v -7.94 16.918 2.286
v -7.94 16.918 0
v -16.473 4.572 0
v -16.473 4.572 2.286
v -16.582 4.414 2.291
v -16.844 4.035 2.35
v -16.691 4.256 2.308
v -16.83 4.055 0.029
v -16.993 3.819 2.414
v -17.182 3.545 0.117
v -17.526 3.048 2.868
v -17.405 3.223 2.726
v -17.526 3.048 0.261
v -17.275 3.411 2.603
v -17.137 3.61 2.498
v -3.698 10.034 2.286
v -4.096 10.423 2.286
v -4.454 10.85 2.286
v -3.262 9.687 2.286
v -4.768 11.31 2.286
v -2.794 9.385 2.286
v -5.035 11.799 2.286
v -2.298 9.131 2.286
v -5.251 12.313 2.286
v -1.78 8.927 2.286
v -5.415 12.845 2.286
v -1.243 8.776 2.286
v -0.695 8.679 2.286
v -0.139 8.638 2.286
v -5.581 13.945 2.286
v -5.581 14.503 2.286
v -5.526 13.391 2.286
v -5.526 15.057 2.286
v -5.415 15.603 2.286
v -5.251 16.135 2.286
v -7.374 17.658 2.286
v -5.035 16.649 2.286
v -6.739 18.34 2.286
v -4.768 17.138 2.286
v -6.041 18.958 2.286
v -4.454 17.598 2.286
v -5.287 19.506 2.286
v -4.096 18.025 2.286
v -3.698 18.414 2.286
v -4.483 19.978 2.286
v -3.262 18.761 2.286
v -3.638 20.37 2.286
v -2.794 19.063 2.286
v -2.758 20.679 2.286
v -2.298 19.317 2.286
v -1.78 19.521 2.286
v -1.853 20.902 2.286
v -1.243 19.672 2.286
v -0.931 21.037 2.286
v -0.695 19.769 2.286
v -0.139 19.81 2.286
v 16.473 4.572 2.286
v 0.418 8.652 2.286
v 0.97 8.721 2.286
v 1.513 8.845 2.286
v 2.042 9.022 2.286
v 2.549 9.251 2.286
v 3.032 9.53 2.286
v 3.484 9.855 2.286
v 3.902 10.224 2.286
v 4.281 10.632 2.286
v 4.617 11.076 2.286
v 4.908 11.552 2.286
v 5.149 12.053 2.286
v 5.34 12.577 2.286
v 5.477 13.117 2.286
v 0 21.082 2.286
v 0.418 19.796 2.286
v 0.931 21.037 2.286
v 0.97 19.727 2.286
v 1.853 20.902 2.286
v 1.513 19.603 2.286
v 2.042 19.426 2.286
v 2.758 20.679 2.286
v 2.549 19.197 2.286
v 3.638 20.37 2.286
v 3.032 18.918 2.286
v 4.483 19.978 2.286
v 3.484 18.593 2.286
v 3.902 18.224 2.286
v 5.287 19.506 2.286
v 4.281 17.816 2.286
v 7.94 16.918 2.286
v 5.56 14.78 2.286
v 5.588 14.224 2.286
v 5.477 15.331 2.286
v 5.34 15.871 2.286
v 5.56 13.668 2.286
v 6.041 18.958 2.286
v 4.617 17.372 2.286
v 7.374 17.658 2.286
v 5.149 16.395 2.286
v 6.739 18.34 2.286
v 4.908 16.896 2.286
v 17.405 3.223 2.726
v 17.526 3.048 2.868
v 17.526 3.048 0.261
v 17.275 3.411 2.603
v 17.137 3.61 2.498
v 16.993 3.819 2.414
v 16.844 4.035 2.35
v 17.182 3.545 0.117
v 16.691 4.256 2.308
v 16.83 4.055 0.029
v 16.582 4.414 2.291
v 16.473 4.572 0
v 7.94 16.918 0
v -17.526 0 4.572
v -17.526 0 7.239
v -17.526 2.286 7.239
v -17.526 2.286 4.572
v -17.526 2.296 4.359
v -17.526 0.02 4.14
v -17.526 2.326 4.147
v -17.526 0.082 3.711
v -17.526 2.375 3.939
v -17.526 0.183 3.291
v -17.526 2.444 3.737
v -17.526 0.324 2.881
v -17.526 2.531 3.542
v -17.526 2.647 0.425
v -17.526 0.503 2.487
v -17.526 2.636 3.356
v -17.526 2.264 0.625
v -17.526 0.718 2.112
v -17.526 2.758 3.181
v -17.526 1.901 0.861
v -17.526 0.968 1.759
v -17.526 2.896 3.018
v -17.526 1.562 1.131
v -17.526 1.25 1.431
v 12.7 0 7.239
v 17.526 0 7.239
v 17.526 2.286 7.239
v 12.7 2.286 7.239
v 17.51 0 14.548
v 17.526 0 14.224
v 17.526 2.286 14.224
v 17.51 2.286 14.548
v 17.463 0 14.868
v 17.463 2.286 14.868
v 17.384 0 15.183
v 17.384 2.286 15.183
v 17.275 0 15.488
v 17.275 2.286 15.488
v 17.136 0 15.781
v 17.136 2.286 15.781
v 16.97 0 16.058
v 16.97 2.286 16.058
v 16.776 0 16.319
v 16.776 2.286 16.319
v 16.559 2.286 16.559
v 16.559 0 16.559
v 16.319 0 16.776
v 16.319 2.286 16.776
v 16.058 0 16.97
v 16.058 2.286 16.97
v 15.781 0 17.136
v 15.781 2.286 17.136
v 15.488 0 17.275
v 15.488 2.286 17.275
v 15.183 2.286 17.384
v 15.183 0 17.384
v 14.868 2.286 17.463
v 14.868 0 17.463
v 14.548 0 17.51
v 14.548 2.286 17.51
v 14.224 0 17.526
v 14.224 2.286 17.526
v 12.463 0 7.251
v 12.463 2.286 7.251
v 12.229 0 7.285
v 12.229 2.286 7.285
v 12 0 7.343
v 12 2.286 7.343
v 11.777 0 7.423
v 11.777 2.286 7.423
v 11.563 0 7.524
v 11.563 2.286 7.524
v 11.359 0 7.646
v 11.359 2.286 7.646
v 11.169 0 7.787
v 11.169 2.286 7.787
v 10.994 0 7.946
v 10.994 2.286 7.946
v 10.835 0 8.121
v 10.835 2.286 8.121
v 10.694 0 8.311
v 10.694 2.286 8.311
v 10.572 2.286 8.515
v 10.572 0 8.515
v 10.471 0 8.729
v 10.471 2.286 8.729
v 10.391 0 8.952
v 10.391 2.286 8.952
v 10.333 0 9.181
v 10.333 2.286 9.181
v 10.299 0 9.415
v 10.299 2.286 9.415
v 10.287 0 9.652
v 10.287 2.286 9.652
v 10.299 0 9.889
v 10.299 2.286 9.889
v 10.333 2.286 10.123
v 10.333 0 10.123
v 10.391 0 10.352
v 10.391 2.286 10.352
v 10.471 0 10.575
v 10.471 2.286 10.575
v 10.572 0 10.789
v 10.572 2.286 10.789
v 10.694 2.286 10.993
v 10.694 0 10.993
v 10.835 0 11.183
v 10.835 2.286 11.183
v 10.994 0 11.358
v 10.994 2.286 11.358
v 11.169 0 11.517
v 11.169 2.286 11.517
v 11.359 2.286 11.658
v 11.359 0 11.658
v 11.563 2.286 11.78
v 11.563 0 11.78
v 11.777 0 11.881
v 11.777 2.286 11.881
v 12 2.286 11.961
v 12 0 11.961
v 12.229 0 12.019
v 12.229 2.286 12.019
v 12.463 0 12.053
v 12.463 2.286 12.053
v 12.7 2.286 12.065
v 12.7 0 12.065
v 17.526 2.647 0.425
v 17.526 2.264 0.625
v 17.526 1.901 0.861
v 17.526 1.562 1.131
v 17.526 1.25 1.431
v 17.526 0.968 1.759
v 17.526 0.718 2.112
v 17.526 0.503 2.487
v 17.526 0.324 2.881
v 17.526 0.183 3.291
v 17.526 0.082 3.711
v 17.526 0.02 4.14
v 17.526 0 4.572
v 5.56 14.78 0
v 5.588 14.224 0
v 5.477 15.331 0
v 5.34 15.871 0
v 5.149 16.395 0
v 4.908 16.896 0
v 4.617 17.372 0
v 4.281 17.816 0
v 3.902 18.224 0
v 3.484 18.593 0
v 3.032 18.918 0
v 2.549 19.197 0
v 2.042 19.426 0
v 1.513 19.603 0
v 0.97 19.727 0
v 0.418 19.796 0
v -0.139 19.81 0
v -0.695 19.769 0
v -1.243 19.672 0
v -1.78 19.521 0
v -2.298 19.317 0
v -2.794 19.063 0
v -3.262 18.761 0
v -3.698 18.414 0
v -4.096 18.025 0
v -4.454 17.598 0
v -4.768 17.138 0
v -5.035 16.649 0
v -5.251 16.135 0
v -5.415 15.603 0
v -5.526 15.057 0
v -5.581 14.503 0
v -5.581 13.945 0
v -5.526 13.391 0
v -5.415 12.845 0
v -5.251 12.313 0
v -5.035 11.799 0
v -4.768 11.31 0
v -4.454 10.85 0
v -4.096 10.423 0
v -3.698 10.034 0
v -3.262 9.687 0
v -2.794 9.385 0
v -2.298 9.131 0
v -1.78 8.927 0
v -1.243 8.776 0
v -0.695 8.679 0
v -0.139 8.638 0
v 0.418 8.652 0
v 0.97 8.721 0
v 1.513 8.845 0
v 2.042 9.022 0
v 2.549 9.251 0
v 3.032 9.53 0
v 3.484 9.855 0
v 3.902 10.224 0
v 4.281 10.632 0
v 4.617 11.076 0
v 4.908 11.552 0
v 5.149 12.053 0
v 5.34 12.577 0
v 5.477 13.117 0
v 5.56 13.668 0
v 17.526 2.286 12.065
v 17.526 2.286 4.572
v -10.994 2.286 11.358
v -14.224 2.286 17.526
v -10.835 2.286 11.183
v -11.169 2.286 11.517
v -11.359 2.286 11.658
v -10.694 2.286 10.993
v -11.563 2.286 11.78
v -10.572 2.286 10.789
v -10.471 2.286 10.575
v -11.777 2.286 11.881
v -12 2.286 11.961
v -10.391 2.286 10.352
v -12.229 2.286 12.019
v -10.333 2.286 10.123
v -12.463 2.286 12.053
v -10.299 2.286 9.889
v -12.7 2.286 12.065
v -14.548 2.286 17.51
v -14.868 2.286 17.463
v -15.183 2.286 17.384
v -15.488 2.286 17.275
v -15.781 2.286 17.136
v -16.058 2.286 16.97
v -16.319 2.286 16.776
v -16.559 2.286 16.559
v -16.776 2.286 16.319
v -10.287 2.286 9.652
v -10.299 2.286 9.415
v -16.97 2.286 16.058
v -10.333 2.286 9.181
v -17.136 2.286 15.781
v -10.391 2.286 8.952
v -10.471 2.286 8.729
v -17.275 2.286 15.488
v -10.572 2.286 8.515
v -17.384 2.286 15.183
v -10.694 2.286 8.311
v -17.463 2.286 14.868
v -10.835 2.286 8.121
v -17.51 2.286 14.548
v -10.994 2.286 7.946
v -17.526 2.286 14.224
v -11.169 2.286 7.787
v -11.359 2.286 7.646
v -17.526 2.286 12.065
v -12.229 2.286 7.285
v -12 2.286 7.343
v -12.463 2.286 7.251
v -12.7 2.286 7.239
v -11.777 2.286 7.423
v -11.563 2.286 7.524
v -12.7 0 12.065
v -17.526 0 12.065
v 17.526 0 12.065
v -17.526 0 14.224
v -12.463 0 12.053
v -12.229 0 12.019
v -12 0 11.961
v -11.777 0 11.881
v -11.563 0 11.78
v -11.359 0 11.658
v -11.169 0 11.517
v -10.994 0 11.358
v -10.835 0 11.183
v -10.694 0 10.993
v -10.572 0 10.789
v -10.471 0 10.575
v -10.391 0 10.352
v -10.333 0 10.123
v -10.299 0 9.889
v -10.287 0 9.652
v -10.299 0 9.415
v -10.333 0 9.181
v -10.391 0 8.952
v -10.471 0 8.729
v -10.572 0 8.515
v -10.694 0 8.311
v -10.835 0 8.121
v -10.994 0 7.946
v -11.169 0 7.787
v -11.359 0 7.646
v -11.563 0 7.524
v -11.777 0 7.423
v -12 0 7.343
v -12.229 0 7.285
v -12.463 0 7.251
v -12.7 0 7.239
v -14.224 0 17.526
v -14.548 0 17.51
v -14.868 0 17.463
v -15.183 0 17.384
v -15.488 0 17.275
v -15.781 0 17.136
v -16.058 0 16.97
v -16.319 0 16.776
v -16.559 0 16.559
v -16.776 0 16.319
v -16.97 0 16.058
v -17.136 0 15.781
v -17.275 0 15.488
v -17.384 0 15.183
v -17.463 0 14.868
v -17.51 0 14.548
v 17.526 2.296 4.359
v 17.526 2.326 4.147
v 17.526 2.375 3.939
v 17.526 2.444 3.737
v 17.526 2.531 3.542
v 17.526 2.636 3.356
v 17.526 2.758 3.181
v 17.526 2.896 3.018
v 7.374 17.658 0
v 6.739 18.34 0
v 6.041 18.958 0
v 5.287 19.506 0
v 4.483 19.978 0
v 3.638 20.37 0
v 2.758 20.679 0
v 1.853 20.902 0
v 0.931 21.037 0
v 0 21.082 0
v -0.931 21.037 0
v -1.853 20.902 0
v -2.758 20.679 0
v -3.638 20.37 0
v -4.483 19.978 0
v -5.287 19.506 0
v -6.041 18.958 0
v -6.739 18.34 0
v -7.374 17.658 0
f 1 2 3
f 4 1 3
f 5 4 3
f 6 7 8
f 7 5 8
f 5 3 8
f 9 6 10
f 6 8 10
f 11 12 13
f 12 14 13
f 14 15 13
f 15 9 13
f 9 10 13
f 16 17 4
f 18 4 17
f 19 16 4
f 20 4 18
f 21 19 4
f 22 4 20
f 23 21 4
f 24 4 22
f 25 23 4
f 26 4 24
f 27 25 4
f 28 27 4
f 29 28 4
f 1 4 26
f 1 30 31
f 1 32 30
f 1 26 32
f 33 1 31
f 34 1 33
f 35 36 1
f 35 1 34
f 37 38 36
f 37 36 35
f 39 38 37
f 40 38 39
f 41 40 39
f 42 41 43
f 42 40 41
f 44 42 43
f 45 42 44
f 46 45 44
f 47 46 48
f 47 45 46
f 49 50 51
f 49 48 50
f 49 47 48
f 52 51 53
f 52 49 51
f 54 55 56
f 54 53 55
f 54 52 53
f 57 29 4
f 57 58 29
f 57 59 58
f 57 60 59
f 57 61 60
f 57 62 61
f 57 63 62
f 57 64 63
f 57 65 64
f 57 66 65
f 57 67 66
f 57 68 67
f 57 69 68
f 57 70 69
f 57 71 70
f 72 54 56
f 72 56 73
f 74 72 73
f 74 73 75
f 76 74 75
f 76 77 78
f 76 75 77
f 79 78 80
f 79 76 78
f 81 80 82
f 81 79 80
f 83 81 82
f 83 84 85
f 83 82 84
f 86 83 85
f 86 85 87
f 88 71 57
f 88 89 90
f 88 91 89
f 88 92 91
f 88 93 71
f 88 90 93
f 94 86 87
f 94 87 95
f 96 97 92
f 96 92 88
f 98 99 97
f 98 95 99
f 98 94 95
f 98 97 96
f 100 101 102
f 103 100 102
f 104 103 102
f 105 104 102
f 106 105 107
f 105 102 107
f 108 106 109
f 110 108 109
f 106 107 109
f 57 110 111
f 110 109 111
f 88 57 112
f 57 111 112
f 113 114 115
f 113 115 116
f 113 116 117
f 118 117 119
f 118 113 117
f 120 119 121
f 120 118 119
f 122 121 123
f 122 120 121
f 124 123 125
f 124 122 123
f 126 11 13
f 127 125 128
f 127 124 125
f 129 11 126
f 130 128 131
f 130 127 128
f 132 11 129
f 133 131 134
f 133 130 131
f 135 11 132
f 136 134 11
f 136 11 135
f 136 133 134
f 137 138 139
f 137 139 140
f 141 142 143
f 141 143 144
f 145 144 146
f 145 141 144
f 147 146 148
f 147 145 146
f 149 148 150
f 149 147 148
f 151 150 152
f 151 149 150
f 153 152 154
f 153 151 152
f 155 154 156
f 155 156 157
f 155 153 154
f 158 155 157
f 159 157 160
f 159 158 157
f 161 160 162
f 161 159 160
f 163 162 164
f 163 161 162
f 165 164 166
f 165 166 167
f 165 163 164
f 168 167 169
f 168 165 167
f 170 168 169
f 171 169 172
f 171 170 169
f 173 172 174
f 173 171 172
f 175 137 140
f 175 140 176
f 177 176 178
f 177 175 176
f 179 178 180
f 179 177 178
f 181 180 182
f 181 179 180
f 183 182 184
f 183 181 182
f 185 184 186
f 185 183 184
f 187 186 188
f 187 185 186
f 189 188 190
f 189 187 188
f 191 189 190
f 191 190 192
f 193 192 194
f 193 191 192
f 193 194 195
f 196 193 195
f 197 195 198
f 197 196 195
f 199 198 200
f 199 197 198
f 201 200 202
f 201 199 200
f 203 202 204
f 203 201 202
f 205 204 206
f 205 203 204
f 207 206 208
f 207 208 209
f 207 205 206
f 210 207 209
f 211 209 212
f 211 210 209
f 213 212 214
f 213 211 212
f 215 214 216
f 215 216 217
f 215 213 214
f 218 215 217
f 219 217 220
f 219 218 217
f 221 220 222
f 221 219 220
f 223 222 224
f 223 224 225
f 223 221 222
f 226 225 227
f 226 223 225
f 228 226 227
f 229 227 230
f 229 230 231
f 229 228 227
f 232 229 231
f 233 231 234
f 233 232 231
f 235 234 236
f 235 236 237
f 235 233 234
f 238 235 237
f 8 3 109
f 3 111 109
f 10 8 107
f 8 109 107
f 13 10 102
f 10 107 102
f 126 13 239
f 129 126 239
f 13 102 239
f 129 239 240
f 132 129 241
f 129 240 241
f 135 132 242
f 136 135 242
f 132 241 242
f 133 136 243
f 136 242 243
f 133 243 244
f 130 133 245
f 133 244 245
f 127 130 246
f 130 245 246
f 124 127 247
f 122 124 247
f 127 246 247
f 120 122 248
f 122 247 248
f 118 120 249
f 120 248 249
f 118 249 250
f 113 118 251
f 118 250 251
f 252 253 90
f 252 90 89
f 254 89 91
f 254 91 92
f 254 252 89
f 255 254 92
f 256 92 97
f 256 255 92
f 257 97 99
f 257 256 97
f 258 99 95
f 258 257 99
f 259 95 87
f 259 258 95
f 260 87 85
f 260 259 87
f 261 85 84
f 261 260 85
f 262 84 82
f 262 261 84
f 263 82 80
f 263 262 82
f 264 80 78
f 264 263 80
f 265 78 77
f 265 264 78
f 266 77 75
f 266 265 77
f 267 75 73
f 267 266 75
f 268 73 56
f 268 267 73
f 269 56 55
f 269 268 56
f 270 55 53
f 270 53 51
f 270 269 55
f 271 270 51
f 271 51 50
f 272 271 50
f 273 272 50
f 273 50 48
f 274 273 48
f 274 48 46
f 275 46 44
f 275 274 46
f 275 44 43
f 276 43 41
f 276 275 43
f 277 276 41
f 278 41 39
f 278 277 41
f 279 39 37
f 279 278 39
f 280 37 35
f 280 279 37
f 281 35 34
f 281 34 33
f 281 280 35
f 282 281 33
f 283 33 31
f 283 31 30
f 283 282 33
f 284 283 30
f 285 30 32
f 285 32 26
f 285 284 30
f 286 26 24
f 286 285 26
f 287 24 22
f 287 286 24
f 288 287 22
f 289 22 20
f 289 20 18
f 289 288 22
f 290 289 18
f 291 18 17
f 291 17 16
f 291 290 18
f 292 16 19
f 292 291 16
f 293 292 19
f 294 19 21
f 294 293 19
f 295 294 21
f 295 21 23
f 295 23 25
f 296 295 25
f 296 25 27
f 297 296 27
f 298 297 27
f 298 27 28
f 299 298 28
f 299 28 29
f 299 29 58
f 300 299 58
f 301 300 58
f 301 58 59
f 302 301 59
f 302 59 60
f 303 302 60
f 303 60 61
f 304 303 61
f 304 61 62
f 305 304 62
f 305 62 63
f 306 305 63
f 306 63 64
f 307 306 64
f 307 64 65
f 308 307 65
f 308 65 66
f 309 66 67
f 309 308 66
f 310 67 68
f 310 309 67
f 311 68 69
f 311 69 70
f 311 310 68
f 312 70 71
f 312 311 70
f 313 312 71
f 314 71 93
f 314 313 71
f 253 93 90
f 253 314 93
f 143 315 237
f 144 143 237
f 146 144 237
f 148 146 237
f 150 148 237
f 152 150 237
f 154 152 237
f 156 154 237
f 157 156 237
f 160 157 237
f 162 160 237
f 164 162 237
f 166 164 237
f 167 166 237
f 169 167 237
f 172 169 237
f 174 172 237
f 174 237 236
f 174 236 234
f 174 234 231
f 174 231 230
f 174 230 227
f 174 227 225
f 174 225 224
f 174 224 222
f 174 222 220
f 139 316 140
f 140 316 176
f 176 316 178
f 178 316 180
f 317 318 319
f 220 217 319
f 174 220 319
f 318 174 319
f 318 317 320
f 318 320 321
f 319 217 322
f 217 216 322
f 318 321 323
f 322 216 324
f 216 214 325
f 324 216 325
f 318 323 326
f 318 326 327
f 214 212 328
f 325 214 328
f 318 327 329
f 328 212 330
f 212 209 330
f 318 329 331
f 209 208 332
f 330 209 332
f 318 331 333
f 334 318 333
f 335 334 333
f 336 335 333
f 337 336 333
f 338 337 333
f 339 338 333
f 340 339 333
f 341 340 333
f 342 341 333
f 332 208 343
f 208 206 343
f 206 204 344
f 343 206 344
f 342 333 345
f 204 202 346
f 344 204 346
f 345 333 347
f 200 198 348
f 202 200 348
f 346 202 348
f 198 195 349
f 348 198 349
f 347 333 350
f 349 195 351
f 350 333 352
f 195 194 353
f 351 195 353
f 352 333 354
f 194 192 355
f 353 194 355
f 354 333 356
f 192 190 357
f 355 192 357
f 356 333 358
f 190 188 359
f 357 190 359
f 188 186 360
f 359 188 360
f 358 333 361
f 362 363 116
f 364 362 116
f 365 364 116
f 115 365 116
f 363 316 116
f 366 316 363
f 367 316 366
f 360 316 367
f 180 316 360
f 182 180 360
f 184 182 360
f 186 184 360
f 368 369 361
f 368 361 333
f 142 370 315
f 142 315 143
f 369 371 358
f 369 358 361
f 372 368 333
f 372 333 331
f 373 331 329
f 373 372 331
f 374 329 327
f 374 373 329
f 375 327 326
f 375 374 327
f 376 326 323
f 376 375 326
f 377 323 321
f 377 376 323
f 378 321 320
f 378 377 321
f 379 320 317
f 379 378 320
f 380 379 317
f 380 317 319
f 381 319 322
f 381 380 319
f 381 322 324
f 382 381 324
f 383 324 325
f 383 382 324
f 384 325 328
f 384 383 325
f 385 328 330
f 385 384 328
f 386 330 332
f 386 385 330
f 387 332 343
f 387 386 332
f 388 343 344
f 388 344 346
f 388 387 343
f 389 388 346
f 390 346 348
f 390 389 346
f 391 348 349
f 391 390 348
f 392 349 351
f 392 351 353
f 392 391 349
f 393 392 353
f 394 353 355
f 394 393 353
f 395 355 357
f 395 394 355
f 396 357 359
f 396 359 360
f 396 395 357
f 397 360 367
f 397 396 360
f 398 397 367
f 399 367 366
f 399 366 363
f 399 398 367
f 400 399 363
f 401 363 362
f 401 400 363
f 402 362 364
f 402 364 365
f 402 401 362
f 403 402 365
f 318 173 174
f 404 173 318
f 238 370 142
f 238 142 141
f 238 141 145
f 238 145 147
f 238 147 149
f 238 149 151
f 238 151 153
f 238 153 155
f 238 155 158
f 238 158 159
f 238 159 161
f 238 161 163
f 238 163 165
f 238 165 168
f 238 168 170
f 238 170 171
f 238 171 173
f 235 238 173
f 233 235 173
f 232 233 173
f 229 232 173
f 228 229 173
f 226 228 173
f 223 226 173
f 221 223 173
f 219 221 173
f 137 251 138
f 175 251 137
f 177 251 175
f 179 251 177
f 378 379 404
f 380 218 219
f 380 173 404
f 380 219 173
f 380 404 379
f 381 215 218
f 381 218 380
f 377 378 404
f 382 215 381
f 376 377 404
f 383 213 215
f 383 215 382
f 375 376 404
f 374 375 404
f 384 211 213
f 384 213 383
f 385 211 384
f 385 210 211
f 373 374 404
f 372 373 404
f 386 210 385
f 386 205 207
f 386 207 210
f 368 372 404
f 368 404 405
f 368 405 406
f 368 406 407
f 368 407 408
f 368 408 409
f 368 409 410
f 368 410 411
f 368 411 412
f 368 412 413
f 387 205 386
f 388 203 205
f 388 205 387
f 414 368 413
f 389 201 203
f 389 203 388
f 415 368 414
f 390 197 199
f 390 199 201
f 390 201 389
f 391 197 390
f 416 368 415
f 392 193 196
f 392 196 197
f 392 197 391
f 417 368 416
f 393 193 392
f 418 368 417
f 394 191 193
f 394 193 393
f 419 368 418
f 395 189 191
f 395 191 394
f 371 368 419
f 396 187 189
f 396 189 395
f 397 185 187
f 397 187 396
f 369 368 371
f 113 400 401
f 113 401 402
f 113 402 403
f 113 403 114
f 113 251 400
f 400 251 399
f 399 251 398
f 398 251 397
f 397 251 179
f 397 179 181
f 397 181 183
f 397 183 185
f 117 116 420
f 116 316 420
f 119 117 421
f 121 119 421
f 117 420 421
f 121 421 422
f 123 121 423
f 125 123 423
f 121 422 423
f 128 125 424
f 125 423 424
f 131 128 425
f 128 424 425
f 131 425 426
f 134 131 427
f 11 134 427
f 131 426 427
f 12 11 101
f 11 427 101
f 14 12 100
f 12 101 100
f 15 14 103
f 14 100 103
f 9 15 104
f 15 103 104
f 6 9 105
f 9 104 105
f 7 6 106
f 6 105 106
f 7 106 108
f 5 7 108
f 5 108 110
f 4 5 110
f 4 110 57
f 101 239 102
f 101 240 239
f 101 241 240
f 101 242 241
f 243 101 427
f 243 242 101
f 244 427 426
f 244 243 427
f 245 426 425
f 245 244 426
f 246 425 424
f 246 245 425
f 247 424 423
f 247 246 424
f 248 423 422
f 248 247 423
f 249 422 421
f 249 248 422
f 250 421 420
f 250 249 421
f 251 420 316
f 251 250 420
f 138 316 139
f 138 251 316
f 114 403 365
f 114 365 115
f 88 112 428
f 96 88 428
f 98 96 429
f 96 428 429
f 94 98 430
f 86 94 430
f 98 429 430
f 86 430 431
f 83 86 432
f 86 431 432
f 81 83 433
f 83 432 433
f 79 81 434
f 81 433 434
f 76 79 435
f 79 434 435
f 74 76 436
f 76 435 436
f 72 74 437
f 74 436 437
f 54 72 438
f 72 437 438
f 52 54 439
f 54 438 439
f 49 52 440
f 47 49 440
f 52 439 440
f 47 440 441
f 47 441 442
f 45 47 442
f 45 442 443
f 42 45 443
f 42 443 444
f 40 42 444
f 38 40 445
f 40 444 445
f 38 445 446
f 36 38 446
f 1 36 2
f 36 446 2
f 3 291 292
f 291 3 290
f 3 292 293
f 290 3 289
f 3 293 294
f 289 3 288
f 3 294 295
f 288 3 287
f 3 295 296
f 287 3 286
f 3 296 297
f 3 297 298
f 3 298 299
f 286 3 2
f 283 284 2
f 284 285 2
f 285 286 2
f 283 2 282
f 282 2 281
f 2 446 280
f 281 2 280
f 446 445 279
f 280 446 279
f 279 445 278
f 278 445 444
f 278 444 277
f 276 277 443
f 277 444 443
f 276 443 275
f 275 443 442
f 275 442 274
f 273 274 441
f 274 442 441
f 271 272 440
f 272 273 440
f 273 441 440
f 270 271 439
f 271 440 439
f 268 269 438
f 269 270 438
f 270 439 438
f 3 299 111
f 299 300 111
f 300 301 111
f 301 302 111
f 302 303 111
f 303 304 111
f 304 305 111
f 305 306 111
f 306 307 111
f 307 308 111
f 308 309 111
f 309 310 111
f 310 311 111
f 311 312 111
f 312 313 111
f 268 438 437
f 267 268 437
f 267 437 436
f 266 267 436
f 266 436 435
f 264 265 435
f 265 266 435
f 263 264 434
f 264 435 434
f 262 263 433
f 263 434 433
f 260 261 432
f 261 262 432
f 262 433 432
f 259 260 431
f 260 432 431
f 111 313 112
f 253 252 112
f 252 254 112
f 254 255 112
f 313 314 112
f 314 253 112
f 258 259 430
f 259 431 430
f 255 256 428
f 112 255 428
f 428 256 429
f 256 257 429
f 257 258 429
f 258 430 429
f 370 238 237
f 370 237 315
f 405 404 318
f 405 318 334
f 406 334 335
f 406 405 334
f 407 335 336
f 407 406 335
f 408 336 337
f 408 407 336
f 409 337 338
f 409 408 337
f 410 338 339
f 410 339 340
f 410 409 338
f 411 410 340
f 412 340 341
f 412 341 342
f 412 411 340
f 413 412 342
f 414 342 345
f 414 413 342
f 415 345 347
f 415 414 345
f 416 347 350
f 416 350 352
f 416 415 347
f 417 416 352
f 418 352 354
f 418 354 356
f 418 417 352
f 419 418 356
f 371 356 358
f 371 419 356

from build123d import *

# Parameters (mm, degrees)
SKETCH1_R           = 5.588
BOSS_EXTRUDE1_DEPTH = 2.286
BOSS_EXTRUDE2_DEPTH = 2.286
FILLET1_R           = 2.286
FILLET2_R           = 4.572


with BuildPart() as part:
    # Sketch1 → Boss-Extrude1 (new body)
    with BuildSketch(Plane.XY):
        with BuildLine():
            Line((-17.526, 0), (17.526, 0))
            Line((17.526, 0), (17.526, 3.048))
            Line((17.526, 3.048), (7.94015483, 16.917717675))
            ThreePointArc((7.94015483, 16.917717675), (0, 21.082), (-7.94015483, 16.917717675))
            Line((-7.94015483, 16.917717675), (-17.526, 3.048))
            Line((-17.526, 3.048), (-17.526, 0))
        make_face()
        with Locations((0, 14.224)):
            Circle(SKETCH1_R, mode=Mode.SUBTRACT)
    extrude(amount=BOSS_EXTRUDE1_DEPTH)

    # Sketch2 → Boss-Extrude2 (add)
    with BuildSketch(Plane(origin=(0, 0, 2.286), x_dir=(1, 0, 0), z_dir=(0, 1, 0))):
        with BuildLine():
            Line((-12.7, -4.953), (-17.526, -4.953))
            Line((-17.526, -4.953), (-17.526, 2.286))
            Line((-17.526, 2.286), (17.526, 2.286))
            Line((17.526, 2.286), (17.526, -4.953))
            Line((17.526, -4.953), (12.7, -4.953))
            ThreePointArc((12.7, -4.953), (10.287, -7.366), (12.7, -9.779))
            Line((12.7, -9.779), (17.526, -9.779))
            Line((17.526, -9.779), (17.526, -11.938))
            ThreePointArc((17.526, -11.938), (16.558866591, -14.272866591), (14.224, -15.24))
            Line((14.224, -15.24), (-14.224, -15.24))
            ThreePointArc((-14.224, -15.24), (-16.558866591, -14.272866591), (-17.526, -11.938))
            Line((-17.526, -11.938), (-17.526, -9.779))
            Line((-17.526, -9.779), (-12.7, -9.779))
            ThreePointArc((-12.7, -9.779), (-10.287, -7.366), (-12.7, -4.953))
        make_face()
    extrude(amount=BOSS_EXTRUDE2_DEPTH)

    # Fillet1
    fillet1_edges = [part.edges().sort_by_distance(p)[0] for p in [
        (0, 2.286, 2.286),
    ]]
    fillet(fillet1_edges, radius=FILLET1_R)

    # Fillet2
    fillet2_edges = [part.edges().sort_by_distance(p)[0] for p in [
        (0, 0, 0),
    ]]
    fillet(fillet2_edges, radius=FILLET2_R)


solid = part.part
